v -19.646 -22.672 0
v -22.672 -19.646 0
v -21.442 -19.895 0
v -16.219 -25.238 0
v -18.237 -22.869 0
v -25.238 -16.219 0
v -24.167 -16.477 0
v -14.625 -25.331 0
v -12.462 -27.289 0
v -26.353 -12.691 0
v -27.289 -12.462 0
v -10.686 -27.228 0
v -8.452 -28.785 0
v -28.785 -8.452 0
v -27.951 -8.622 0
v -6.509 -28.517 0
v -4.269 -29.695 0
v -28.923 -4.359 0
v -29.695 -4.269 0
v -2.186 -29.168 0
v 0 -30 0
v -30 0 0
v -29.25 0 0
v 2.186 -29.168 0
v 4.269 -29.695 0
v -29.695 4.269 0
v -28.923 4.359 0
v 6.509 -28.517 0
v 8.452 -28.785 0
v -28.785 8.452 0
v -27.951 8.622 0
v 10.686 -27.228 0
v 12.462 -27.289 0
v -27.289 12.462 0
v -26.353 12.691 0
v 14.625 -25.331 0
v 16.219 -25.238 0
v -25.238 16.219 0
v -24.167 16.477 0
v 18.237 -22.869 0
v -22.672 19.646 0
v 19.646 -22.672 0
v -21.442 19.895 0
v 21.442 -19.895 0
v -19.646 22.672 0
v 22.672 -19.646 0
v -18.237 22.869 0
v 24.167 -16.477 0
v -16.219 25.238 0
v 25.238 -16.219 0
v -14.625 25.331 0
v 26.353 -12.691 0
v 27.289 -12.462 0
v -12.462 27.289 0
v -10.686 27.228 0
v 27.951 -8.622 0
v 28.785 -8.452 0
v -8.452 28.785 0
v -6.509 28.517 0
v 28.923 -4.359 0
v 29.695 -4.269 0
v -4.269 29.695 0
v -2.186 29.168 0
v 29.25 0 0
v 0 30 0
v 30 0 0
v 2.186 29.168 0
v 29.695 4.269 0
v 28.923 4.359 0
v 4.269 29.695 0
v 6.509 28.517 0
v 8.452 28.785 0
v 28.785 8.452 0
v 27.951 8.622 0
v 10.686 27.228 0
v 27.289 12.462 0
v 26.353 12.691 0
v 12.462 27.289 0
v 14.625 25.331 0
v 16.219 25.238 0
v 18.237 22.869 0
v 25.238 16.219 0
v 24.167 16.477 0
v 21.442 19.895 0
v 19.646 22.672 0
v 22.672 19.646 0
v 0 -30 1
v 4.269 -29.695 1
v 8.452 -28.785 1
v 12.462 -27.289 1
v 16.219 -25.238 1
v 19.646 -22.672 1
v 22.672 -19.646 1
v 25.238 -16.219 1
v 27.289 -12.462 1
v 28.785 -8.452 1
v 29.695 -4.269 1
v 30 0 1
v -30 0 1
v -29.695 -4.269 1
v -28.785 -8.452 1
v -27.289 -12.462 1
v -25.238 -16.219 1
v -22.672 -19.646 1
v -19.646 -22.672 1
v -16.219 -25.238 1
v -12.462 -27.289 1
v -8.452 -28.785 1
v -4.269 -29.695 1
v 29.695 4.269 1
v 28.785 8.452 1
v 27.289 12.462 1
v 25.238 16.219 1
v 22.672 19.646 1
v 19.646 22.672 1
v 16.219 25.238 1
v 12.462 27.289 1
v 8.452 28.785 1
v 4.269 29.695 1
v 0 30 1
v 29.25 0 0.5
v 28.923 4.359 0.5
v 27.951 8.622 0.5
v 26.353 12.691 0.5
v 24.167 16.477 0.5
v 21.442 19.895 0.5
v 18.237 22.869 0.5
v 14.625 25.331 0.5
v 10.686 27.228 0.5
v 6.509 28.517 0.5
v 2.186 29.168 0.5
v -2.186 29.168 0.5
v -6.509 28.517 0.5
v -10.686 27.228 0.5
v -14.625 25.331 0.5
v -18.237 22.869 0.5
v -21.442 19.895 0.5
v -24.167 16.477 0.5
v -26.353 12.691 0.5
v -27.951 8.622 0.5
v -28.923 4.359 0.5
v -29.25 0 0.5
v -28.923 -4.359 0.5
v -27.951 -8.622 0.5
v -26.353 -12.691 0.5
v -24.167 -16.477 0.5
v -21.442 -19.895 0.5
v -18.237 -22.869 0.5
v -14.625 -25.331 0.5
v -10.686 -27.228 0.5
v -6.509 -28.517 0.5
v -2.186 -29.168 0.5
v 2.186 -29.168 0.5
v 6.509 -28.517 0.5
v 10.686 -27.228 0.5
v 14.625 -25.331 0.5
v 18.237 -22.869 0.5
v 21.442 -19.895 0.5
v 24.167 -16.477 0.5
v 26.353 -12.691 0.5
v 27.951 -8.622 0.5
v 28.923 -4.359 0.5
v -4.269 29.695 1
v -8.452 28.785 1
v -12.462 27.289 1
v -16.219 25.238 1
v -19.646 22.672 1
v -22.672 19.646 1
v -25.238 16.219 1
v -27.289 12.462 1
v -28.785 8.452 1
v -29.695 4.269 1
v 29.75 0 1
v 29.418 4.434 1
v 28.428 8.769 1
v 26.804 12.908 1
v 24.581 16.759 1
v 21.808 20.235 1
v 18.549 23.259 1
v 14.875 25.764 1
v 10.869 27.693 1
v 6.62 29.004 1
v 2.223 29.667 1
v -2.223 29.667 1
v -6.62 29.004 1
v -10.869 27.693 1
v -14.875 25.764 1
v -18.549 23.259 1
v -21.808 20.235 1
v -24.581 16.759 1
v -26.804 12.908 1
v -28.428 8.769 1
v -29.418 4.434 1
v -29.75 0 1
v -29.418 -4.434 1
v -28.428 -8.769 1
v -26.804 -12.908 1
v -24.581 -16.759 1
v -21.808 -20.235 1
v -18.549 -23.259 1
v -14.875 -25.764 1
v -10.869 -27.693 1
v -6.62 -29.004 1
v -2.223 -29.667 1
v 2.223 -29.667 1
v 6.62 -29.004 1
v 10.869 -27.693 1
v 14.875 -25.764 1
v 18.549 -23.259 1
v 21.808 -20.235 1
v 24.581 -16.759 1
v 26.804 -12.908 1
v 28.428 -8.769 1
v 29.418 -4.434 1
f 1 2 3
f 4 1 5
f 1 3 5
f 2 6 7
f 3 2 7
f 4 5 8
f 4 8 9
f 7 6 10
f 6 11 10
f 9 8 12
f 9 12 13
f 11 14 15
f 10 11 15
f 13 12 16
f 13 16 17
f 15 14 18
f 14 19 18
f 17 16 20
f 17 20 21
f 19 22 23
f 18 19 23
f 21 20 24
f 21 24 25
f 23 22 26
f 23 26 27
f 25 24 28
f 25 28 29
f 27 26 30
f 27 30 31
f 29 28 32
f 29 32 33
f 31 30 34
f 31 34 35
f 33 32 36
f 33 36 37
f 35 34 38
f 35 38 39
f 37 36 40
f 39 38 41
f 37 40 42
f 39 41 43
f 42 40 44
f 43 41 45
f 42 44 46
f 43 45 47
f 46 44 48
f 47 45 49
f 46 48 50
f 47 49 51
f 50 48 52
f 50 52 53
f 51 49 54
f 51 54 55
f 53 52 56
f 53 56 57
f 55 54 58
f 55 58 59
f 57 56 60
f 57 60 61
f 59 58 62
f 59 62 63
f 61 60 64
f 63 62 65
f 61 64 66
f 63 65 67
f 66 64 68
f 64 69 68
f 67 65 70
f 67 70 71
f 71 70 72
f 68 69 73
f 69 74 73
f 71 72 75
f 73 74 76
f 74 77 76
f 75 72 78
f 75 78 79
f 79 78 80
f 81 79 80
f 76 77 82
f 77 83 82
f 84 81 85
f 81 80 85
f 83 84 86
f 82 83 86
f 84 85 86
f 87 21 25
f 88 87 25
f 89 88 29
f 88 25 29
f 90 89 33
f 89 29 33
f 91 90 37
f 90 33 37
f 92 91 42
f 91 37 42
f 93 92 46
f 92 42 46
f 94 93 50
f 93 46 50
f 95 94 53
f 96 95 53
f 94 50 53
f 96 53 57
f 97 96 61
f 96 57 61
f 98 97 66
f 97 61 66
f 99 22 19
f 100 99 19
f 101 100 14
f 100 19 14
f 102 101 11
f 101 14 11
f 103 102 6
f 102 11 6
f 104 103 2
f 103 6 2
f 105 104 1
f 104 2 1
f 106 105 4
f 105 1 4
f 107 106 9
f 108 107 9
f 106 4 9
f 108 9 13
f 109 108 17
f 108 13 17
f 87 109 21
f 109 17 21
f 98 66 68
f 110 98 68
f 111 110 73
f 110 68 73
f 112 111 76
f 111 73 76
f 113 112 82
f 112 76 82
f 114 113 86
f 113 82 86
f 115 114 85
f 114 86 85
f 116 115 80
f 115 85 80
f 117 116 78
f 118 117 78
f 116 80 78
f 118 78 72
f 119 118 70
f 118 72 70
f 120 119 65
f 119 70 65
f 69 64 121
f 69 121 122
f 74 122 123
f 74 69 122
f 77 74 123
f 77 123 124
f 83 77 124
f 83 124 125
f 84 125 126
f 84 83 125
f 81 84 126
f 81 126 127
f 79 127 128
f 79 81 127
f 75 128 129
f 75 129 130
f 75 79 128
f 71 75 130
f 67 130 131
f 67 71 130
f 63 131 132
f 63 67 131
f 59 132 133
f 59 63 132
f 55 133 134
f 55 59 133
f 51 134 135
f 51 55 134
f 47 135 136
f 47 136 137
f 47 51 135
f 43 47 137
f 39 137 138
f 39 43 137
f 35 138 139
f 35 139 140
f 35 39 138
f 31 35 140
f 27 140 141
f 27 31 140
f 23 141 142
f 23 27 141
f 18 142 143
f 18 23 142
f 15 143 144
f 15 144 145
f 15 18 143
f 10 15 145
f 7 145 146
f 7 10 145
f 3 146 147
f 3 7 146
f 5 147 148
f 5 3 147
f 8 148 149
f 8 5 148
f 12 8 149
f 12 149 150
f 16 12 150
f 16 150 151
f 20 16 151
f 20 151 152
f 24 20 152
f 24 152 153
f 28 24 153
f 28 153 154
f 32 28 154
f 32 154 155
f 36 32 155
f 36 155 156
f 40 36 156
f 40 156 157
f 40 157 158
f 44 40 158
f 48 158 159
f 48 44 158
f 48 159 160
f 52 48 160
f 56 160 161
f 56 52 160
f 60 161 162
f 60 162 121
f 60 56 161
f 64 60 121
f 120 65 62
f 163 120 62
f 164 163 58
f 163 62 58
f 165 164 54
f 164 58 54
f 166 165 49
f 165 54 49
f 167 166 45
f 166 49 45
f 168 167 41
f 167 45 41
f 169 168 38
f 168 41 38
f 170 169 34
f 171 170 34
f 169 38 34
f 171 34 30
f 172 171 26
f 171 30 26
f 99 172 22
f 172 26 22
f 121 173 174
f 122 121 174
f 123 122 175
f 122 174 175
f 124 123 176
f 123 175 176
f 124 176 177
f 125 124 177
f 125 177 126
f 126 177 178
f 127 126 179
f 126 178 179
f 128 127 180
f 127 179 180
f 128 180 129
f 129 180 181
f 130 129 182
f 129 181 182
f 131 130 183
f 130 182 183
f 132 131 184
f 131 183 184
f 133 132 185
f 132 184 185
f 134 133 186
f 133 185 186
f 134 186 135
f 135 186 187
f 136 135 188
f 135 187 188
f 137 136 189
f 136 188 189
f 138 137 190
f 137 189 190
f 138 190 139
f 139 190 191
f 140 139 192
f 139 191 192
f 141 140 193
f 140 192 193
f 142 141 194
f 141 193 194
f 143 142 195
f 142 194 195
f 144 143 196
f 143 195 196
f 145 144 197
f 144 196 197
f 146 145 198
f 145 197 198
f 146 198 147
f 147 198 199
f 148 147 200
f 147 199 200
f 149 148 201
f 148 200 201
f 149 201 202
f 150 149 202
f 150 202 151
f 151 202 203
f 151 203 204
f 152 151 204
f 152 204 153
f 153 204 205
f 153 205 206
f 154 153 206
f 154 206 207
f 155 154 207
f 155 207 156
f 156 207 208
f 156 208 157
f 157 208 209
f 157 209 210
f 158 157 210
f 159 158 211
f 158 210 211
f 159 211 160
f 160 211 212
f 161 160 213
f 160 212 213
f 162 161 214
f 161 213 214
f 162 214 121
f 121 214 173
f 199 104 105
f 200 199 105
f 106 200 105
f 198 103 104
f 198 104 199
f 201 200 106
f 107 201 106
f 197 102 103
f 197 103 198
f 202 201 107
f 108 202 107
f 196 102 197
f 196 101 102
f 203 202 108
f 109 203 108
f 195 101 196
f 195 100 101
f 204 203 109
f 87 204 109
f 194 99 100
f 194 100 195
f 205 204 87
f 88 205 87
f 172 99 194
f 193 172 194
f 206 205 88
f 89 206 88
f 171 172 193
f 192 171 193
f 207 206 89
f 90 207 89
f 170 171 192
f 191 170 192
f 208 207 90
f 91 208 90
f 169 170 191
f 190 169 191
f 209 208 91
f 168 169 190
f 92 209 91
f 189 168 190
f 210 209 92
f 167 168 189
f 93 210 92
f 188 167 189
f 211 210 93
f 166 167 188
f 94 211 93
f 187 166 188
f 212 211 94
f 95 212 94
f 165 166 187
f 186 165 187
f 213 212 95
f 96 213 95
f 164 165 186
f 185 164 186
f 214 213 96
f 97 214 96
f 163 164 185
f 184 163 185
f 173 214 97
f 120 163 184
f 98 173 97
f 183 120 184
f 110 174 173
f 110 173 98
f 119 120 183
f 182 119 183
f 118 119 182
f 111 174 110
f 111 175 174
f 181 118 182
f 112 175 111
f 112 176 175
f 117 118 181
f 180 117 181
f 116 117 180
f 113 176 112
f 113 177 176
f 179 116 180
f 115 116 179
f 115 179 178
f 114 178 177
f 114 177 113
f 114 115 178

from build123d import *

# Parameters (mm, degrees)
F0_R     = 29.25
F1_DEPTH = 1
F2_SIZE  = 0.5


with BuildPart() as f1:
    # F0 (on Top) → F1 (new body)
    with BuildSketch(Plane.XY):
        with BuildLine():
            ThreePointArc((30, 0), (21.213203, 21.213203), (0, 30))
            ThreePointArc((0, 30), (-21.213203, 21.213203), (-30, 0))
            ThreePointArc((-30, 0), (-21.213203, -21.213203), (0, -30))
            ThreePointArc((0, -30), (21.213203, -21.213203), (30, 0))
        make_face()
        Circle(F0_R, mode=Mode.SUBTRACT)
    extrude(amount=F1_DEPTH)

    # F2
    f2_edges = [f1.edges().sort_by_distance(p)[0] for p in [
        (-29.25, 0, 1),
    ]]
    chamfer(f2_edges, length=F2_SIZE)


solid = f1.part
